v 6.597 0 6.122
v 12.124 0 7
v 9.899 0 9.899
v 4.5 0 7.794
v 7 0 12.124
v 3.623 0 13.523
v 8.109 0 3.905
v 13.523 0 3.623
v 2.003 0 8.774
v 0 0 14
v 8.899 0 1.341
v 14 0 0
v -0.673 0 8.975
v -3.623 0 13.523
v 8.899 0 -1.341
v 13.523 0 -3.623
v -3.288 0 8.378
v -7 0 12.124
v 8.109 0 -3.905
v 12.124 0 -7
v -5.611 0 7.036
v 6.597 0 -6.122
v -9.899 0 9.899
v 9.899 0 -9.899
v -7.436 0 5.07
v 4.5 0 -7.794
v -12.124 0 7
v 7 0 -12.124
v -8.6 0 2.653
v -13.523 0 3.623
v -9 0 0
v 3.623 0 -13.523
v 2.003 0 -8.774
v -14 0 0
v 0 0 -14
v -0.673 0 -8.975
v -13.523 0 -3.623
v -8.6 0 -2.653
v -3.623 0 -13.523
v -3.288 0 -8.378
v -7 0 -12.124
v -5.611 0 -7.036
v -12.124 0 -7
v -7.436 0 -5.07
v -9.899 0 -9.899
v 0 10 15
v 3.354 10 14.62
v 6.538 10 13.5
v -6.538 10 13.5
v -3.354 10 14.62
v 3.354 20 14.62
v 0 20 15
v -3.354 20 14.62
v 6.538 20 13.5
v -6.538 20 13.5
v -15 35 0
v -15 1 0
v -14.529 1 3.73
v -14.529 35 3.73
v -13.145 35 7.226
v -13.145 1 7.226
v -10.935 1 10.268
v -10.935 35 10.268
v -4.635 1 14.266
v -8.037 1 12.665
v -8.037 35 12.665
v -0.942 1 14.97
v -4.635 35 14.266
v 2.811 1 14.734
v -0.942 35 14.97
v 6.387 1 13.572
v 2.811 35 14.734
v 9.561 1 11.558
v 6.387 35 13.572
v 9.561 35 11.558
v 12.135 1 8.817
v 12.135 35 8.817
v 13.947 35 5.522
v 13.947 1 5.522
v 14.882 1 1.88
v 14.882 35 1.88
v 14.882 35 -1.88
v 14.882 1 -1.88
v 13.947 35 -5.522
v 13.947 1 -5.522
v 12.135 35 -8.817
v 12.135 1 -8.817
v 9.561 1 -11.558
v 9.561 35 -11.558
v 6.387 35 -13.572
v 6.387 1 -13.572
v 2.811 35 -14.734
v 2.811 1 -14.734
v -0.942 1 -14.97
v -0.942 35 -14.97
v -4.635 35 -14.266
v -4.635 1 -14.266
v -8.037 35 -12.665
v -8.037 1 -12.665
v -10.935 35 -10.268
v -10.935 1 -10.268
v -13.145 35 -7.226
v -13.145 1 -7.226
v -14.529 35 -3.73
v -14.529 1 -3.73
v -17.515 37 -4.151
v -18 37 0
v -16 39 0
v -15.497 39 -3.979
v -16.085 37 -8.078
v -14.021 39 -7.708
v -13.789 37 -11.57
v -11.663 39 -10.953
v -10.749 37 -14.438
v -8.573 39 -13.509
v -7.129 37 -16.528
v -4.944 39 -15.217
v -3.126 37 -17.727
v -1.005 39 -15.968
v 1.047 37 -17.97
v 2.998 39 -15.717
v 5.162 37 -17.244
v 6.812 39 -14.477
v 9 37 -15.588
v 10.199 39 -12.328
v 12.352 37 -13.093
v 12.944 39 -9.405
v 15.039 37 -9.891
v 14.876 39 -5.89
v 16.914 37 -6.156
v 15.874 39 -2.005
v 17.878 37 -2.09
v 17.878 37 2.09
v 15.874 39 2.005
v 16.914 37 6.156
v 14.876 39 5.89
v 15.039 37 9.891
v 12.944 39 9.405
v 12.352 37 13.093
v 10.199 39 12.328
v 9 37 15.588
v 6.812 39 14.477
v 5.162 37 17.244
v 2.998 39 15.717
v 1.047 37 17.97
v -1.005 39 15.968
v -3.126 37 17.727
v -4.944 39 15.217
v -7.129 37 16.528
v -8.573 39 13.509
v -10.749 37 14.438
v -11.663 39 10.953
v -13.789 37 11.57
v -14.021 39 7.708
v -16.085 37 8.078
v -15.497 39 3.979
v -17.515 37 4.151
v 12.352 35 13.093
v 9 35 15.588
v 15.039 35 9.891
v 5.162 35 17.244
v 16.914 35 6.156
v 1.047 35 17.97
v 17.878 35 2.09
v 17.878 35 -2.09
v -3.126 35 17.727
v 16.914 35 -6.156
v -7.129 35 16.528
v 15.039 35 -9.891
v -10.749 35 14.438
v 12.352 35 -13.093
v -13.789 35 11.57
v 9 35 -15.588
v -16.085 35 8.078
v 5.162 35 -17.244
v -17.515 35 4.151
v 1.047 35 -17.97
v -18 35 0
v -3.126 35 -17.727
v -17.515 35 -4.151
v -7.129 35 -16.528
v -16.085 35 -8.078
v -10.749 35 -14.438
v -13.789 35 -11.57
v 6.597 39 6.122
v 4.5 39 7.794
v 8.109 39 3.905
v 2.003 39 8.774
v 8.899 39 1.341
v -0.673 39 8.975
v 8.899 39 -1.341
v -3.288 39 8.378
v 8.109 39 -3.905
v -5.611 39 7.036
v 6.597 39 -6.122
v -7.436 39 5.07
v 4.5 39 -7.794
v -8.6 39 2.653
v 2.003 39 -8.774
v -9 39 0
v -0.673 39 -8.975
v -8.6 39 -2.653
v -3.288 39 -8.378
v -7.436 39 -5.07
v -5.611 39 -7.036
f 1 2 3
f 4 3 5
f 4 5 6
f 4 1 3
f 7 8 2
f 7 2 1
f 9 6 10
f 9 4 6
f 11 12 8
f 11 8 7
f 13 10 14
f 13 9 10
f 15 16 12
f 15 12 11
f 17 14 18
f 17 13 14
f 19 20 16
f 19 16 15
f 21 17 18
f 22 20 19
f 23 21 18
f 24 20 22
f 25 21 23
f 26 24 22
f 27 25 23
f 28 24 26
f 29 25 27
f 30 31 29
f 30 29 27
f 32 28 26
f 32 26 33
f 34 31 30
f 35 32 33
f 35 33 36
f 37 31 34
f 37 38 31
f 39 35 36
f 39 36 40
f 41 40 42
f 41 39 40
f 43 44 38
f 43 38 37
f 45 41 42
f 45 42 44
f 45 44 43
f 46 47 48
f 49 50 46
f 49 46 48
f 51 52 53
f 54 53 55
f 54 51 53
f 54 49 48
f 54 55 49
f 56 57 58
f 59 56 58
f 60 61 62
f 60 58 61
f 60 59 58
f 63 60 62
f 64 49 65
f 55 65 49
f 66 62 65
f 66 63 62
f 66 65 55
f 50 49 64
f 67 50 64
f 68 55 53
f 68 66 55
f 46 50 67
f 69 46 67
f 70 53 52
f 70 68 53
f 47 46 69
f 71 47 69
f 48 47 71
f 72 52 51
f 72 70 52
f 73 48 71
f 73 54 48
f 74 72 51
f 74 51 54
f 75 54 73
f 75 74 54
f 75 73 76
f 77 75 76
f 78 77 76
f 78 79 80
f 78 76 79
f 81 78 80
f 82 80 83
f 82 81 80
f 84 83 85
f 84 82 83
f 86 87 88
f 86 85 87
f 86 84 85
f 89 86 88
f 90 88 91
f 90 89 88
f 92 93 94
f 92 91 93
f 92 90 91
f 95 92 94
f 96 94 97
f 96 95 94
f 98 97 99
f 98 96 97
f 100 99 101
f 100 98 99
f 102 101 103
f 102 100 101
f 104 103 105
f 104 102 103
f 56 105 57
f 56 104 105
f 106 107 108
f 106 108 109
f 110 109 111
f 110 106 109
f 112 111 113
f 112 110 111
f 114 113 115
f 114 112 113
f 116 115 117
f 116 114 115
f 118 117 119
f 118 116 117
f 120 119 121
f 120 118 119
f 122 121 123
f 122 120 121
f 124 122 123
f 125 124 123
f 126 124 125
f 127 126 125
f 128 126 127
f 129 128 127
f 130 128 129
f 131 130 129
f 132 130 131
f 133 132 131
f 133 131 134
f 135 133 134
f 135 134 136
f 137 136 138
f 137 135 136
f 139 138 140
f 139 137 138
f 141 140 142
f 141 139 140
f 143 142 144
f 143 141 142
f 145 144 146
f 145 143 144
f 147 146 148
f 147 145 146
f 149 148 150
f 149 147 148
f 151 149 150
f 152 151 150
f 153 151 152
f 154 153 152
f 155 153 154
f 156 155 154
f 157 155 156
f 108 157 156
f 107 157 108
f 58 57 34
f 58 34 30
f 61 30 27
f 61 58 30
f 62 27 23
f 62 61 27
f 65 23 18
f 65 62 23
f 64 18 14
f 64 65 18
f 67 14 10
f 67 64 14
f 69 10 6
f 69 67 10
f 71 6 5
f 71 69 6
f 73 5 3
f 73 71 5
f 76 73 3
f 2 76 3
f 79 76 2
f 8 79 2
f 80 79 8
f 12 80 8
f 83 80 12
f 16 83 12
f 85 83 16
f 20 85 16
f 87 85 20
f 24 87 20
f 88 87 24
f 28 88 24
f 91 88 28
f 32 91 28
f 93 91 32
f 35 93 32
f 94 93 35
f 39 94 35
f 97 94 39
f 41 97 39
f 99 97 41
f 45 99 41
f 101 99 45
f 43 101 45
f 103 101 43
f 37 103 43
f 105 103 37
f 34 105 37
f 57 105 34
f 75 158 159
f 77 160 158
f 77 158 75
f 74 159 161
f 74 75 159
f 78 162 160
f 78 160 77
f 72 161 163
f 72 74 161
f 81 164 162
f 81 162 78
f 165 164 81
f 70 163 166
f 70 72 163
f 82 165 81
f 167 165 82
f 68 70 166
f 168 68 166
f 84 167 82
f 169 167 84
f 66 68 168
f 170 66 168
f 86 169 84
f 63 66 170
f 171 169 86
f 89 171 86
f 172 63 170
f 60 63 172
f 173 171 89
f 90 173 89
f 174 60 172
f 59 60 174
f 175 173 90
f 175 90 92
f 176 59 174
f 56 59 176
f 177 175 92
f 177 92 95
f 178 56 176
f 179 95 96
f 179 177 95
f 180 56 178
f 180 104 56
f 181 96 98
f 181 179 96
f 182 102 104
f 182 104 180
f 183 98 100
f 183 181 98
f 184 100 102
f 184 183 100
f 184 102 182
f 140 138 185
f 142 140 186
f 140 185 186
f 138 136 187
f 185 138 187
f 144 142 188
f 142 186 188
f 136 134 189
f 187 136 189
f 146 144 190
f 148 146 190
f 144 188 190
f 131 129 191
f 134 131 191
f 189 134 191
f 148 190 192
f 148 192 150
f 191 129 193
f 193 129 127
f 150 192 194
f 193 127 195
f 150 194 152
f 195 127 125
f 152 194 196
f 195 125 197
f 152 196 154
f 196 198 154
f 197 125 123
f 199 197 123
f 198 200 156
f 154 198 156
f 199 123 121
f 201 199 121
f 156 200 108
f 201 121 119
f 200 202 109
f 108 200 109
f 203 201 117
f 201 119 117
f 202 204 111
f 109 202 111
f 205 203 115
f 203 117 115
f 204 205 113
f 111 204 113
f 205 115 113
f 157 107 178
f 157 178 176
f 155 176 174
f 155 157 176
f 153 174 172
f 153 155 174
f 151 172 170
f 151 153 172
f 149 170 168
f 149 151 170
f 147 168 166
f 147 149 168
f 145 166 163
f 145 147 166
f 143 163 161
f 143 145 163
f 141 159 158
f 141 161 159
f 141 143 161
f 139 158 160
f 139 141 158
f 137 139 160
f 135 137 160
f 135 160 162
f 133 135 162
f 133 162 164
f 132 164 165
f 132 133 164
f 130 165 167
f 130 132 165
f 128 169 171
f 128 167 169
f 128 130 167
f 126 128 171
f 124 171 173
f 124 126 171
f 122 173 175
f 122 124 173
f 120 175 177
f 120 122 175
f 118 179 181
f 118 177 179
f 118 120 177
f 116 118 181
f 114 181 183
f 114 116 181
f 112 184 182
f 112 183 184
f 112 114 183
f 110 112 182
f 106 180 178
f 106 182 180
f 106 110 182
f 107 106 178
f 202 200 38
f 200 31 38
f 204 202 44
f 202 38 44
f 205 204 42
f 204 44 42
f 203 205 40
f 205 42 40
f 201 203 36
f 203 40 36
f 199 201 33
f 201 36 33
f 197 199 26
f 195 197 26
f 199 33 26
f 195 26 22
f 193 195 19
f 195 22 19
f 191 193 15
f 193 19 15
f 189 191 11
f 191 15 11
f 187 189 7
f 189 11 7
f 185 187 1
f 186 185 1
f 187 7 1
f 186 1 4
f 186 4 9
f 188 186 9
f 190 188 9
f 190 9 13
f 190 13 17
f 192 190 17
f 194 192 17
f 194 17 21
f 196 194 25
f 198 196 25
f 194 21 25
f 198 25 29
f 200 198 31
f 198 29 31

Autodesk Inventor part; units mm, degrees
ref_plane "YZ Plane" through (0, 0, 0) normal (1, 0, 0) x (0, 1, 0)
ref_plane "XZ Plane" through (0, 0, 0) normal (0, 1, 0) x (-1, 0, 0)
sketch "Sketch1" plane through (0, 0, 0) normal (0, 0, 1) x (1, 0, 0)
  line L0 (-9, 0) -> (-15, 0)
  line L1 (-15, 0) -> (-15, 35)
  line L2 (-15, 35) -> (-18, 35)
  line L3 (-18, 35) -> (-18, 37)
  line L4 (-18, 37) -> (-16, 39)
  line L5 (-16, 39) -> (-9, 39)
  line L6 (-9, 39) -> (-9, 0)
  line L7 (0, 39) -> (0, 0)
  dimension "d0" = 18
  dimension "d1" = 30
  dimension "d2" = 36
  dimension "d3" = 32
  dimension "d4" = 2
  dimension "d5" = 2
  dimension "d6" = 39
revolve "Revolution1" add sketch "Sketch1" angle 360 about axis through (0, 39, 0) along (0, -1, 0)
chamfer "Chamfer1" distance 1 angle 45 1 edges at (15, 0, 0)
thread "Thread1" size "TR20x2" class "7H" standard "ISO Metric Trapezoidal Threads" full length
ref_plane "Work Plane2" through (0, 17.5, 15) normal (0, 0, 1) x (1, 0, 0)
sketch "Sketch3" plane through (0, 17.5, 15) normal (0, 0, 1) x (1, 0, 0)
  line L0 (12.5, -7.5) -> (-12.5, -7.5)
  line L1 (-12.5, -7.5) -> (-12.5, 2.5)
  line L2 (-12.5, 2.5) -> (12.5, 2.5)
  line L3 (12.5, 2.5) -> (12.5, -7.5)
  line L4 (12.5, -7.5) -> (-12.5, 2.5) construction
  line L5 (-12.5, -7.5) -> (12.5, 2.5) construction
  point P0 (0, -17.5)
  point P1 (0, -2.5)
  dimension "d16" = 25
  dimension "d17" = 10
  dimension "d18" = 15
extrude "Extrusion1" cut sketch "Sketch3" against normal blind 1.5
